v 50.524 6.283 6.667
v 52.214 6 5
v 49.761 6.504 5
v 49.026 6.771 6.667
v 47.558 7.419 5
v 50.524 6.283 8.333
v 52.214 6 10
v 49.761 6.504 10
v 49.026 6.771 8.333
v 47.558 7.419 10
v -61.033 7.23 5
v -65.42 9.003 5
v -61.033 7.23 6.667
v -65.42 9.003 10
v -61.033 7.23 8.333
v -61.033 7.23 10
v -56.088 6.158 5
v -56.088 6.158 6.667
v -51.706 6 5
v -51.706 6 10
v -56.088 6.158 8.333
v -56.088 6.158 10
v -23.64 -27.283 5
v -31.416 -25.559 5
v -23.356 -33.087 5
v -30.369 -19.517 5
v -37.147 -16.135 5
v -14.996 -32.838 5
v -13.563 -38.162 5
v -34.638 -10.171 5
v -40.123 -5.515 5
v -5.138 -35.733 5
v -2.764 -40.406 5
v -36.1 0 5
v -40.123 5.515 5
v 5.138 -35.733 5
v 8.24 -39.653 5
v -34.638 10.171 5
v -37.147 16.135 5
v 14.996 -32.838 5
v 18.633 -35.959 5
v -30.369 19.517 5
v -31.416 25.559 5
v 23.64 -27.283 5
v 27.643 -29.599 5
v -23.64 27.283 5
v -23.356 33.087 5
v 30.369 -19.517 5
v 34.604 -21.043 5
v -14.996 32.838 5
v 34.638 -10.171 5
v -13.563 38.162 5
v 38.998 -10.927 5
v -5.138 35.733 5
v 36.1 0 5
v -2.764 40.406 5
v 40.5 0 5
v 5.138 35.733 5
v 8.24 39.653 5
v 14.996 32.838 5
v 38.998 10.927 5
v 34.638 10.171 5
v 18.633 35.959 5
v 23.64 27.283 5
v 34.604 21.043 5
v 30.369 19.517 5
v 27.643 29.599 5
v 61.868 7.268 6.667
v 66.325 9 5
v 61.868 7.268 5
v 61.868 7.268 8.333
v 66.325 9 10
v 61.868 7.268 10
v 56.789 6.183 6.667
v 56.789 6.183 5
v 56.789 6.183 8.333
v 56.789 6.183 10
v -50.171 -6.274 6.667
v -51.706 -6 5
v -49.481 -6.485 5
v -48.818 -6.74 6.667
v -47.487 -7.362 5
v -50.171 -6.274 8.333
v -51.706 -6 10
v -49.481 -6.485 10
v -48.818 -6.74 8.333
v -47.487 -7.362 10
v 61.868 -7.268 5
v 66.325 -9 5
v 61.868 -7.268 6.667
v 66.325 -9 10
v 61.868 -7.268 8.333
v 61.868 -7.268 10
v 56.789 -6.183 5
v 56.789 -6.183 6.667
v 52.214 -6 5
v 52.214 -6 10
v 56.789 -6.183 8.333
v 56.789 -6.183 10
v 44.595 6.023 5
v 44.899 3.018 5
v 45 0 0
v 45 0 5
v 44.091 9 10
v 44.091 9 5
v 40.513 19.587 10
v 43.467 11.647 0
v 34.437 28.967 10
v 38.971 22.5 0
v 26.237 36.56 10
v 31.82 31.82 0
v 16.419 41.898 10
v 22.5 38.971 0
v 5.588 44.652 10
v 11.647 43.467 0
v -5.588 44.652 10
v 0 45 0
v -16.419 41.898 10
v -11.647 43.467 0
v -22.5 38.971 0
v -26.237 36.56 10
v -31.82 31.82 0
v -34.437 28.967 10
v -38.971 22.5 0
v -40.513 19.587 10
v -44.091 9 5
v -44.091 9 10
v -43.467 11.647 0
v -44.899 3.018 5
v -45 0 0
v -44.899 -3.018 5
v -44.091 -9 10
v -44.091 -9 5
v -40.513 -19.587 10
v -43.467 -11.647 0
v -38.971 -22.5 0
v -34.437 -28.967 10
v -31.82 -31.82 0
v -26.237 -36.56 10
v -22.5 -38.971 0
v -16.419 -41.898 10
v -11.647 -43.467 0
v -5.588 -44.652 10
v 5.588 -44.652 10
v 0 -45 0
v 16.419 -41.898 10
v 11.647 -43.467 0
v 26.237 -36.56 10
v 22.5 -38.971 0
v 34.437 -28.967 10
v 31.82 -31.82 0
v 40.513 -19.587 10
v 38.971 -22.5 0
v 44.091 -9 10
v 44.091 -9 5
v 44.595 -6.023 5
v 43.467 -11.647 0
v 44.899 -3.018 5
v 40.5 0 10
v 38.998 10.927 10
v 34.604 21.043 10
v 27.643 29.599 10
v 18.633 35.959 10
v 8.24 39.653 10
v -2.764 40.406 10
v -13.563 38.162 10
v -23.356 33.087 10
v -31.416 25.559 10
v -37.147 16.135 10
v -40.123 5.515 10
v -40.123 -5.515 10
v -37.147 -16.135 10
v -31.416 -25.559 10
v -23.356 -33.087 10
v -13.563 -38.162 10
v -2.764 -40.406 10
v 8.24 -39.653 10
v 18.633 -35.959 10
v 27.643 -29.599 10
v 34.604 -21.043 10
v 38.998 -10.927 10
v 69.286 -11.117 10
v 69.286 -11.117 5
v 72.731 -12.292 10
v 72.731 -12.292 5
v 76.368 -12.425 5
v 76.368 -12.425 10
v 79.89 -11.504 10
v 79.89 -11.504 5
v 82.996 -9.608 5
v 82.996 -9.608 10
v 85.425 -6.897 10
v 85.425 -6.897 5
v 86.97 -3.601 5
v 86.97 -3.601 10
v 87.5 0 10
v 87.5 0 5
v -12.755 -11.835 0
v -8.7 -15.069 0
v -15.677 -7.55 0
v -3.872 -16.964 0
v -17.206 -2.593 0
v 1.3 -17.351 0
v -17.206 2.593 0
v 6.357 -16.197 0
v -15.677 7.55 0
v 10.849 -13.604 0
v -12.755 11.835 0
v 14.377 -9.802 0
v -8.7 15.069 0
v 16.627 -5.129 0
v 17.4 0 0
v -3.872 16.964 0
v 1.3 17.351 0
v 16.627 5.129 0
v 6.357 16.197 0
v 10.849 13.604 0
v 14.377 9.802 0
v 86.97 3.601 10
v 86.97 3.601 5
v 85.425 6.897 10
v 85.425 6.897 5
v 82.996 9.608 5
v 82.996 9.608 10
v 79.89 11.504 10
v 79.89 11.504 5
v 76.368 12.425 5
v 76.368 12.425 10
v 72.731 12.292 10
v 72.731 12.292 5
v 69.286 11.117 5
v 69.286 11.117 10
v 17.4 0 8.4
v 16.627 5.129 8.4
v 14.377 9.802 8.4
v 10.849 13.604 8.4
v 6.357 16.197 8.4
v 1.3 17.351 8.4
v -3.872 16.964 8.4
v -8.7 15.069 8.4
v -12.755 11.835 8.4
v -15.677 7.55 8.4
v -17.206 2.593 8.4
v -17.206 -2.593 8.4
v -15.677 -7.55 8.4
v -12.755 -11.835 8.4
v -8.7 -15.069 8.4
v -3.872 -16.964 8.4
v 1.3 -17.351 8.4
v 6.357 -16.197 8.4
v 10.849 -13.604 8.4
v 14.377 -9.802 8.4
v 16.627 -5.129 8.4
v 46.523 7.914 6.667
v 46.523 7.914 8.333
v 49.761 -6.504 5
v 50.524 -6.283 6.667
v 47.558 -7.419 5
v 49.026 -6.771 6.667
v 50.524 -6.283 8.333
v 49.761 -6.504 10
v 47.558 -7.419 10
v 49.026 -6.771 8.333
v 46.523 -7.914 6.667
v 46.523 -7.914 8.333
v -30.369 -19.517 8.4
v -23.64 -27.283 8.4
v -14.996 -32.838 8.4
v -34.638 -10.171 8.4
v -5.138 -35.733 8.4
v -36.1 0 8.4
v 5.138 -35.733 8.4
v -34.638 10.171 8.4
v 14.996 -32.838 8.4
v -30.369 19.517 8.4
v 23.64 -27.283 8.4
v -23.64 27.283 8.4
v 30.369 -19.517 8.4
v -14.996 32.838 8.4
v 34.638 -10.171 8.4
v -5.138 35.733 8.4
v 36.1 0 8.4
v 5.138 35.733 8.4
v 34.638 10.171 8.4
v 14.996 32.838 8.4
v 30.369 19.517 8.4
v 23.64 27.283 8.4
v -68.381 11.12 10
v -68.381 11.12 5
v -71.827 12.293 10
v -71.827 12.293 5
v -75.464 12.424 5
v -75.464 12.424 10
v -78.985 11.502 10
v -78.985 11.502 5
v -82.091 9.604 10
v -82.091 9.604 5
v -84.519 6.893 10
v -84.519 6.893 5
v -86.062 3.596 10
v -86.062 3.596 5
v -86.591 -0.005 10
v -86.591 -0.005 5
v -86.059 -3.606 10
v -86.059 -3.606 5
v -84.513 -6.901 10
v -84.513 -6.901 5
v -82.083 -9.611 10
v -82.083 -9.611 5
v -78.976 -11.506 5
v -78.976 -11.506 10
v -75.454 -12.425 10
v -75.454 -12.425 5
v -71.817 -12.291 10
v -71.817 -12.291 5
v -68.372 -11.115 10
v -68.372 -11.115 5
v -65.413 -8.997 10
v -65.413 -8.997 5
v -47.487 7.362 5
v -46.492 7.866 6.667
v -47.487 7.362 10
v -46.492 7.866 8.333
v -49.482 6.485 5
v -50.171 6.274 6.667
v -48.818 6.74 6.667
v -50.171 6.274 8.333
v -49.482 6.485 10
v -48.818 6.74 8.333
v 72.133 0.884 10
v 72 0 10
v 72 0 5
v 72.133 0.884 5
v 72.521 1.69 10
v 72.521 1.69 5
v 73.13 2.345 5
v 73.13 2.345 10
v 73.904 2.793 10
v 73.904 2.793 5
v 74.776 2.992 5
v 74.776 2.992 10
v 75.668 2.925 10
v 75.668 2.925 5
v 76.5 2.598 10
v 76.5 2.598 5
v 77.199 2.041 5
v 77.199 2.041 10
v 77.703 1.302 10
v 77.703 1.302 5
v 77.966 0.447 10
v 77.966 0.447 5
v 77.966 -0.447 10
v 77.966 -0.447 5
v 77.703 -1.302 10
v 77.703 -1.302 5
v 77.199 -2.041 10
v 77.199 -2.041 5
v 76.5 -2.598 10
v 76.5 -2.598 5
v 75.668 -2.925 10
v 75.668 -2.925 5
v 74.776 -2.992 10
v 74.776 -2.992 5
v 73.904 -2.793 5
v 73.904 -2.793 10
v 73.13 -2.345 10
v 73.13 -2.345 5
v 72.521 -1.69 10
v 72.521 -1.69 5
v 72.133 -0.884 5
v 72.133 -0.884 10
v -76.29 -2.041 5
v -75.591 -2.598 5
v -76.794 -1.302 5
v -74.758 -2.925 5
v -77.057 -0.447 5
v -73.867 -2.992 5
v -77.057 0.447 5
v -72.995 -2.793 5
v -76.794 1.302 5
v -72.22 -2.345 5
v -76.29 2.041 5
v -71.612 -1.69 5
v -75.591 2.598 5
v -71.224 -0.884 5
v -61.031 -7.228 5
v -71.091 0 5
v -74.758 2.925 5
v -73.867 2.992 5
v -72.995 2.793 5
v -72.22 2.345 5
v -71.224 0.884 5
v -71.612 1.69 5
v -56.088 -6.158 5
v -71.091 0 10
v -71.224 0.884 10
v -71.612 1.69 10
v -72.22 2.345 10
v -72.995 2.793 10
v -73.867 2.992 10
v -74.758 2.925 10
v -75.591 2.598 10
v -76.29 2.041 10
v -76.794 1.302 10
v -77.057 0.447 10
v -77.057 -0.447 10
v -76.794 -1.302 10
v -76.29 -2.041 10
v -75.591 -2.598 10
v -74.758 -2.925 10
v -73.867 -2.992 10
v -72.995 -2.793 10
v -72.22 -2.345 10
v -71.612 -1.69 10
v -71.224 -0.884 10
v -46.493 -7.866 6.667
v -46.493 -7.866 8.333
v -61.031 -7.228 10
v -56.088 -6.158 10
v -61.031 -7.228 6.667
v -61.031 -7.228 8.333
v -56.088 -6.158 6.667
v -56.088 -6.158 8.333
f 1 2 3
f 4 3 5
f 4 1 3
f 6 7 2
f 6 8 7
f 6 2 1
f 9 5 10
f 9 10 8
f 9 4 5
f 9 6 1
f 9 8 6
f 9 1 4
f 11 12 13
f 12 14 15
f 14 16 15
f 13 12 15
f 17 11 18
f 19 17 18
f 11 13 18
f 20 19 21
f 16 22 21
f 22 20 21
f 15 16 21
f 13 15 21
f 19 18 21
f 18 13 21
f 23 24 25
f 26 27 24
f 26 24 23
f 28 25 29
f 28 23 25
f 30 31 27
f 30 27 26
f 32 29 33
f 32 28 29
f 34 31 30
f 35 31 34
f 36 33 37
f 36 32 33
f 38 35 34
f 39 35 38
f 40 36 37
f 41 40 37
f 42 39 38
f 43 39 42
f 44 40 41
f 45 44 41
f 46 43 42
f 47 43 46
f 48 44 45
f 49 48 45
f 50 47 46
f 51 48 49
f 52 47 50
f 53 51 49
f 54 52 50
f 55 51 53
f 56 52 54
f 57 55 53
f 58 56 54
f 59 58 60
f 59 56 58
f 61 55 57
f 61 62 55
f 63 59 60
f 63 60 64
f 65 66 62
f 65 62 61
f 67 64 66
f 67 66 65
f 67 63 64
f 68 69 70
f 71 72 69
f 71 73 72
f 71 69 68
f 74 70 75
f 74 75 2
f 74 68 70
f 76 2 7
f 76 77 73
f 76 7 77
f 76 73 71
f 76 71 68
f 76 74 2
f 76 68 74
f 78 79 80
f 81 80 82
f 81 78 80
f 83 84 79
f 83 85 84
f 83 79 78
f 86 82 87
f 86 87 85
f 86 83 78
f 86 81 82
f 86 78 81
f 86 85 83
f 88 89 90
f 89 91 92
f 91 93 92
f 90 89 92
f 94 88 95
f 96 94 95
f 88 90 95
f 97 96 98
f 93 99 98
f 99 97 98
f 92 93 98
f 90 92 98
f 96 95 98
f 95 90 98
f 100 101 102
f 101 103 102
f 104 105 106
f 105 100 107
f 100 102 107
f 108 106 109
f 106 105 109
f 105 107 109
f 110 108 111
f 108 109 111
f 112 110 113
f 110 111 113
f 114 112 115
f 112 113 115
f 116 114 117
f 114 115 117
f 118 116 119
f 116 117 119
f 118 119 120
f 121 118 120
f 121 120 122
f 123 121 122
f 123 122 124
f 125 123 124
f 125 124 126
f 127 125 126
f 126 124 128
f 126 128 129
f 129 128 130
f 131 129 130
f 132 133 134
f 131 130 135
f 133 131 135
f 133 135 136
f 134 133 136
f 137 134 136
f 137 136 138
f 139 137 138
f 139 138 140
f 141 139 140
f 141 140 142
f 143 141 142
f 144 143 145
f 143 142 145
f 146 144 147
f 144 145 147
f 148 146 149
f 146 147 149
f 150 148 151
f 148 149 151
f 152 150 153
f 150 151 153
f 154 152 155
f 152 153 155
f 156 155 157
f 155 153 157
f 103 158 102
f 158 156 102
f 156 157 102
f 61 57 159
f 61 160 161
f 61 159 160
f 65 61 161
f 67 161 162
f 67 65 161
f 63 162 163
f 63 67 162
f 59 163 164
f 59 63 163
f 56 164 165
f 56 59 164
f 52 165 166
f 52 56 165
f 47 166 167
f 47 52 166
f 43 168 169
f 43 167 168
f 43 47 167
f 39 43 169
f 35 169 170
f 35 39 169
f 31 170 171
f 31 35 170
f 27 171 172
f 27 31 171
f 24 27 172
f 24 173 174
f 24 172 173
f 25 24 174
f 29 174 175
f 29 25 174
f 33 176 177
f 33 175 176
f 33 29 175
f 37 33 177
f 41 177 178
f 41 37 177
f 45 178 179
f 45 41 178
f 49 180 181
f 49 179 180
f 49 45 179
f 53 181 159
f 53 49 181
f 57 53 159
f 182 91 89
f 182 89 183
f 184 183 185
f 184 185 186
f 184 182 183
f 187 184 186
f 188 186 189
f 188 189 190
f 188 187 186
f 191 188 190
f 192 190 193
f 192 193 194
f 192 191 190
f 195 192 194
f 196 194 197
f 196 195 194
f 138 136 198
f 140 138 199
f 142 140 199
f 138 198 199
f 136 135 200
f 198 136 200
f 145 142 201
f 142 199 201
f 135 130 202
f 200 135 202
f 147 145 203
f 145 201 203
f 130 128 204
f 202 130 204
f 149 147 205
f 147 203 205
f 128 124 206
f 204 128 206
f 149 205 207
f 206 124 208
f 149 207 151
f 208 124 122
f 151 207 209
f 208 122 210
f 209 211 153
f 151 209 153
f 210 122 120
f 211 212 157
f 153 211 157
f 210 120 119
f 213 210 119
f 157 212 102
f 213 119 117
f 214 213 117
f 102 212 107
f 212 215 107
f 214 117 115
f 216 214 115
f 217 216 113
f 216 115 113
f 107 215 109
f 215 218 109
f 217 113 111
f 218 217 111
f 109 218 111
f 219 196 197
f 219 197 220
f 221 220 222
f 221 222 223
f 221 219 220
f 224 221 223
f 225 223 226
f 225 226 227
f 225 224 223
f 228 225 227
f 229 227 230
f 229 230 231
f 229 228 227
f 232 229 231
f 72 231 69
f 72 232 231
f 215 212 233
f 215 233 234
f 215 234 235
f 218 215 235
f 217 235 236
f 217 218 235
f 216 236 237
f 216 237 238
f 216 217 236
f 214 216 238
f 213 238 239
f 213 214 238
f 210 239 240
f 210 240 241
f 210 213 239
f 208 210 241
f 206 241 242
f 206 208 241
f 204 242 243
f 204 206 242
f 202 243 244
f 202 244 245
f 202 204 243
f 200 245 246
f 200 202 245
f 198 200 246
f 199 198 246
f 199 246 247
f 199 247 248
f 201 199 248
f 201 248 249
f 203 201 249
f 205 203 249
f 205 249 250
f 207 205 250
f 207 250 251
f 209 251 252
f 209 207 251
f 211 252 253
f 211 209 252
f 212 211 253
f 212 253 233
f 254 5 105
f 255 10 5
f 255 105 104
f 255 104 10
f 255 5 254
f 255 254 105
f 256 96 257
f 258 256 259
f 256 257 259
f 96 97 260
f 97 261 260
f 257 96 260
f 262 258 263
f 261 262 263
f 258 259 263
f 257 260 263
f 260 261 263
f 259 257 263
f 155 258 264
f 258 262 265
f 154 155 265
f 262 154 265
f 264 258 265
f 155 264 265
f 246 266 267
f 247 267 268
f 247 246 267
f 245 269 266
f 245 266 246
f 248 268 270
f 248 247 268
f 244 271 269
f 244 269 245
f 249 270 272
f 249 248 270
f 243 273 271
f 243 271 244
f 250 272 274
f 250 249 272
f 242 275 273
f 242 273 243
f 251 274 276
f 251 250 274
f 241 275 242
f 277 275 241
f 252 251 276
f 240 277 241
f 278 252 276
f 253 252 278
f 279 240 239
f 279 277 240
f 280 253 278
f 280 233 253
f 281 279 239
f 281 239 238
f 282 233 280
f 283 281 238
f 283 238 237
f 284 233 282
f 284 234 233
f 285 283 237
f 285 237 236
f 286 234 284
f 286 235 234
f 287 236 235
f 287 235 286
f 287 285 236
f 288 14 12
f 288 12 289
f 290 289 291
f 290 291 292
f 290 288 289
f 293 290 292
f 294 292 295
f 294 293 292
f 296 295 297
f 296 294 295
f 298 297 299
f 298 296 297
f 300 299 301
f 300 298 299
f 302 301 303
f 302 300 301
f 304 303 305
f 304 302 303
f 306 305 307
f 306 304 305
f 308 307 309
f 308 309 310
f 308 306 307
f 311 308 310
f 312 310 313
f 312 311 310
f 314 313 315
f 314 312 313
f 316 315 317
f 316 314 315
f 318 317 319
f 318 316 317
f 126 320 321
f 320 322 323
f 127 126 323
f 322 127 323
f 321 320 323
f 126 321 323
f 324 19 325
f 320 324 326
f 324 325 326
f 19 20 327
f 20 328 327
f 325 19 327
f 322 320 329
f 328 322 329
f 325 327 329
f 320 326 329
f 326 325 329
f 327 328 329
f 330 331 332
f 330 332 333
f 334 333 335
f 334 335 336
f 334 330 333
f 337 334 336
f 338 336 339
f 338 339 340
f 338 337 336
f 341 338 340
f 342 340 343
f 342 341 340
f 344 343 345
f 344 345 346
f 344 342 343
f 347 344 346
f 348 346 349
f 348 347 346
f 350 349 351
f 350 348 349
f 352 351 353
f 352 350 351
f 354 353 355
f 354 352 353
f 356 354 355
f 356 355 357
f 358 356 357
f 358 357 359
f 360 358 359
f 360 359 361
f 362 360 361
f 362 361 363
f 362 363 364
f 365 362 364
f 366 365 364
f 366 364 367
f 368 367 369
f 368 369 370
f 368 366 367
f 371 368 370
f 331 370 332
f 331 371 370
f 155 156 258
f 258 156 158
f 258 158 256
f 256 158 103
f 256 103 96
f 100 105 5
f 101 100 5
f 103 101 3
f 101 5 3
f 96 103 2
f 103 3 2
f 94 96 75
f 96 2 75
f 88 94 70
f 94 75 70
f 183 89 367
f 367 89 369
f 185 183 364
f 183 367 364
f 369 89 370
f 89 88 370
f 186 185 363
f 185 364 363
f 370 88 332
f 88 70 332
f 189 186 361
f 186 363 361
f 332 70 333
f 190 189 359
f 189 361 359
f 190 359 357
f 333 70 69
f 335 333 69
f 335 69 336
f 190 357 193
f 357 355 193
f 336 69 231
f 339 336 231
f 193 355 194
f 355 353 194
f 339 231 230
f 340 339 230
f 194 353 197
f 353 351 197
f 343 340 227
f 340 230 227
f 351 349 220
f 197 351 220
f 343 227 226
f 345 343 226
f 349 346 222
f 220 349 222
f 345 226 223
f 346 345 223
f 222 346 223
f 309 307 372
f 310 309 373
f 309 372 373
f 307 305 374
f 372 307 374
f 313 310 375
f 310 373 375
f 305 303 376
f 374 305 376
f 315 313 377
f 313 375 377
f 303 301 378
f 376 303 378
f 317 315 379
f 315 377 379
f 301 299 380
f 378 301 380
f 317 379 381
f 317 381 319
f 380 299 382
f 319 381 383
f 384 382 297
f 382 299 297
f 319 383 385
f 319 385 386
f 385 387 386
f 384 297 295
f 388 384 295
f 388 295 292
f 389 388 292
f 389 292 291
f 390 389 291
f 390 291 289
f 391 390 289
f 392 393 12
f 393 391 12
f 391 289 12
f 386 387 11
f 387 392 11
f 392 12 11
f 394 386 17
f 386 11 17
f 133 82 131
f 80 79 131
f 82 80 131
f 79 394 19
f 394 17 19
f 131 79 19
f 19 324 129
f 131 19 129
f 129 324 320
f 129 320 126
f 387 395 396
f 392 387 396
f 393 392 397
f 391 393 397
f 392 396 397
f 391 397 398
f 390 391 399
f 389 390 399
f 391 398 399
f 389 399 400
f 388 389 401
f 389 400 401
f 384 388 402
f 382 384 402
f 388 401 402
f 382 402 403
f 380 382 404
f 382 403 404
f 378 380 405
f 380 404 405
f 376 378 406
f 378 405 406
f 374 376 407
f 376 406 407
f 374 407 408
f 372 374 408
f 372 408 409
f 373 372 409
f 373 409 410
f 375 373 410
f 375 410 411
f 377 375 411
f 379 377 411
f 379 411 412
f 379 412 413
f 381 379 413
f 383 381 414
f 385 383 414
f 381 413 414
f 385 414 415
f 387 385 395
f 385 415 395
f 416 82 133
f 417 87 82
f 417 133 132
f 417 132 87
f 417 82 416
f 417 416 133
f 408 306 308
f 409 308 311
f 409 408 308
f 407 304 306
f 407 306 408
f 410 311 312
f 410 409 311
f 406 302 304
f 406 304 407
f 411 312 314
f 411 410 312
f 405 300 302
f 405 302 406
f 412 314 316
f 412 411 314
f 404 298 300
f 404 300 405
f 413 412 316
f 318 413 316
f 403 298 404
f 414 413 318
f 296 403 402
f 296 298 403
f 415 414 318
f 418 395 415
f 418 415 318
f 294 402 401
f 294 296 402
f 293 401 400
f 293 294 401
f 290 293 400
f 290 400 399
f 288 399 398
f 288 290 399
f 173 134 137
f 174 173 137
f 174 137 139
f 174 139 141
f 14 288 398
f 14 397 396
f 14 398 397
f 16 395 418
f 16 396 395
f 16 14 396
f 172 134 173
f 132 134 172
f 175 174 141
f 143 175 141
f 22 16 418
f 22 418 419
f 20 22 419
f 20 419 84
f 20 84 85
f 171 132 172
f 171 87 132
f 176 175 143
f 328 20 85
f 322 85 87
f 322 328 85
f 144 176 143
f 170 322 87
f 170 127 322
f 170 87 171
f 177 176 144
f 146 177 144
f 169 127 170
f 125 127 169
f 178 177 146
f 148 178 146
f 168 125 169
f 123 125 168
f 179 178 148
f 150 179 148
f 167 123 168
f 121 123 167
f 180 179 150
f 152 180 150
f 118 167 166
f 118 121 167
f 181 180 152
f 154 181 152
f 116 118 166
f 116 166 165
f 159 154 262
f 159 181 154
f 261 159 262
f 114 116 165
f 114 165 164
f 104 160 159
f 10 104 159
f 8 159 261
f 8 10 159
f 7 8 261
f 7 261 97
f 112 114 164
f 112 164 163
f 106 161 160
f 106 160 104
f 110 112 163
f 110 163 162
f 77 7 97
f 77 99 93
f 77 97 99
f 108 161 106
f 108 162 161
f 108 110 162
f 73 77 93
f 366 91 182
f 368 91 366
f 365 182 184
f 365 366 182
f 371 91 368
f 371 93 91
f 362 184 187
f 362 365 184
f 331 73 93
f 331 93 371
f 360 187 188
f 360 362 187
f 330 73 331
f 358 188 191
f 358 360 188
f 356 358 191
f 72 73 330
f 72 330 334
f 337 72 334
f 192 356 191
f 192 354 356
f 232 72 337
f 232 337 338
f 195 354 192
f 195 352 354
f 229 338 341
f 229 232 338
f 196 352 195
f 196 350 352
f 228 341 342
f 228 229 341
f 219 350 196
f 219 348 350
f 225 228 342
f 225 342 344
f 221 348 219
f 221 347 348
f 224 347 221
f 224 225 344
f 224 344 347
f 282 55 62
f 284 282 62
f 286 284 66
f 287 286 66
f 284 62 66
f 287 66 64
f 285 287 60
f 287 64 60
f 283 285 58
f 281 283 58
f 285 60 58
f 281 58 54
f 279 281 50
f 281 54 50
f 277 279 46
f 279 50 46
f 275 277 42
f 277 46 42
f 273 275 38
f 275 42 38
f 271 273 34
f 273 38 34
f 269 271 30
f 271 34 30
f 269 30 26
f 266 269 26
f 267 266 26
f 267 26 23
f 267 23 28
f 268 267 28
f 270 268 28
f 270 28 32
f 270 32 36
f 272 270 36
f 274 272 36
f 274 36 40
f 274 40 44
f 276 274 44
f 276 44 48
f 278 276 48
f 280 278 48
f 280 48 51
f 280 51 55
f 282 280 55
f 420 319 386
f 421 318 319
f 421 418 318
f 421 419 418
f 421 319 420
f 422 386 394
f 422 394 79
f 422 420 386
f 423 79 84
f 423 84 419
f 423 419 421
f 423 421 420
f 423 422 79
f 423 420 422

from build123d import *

# Parameters (mm, degrees)
F0_R        = 45
F0_R_2      = 40.5
F1_DEPTH    = 10
F0_R_3      = 36.1
F2_DEPTH    = 5
F0_R_4      = 31
F3_DEPTH    = 8.4
F0_R_5      = 17.4
F4_DEPTH    = 8.4
F5_R        = 3
F1_FACE_R   = 45
F1_FACE_R_2 = 40.5
F6_DEPTH    = 5


with BuildPart() as f1:
    # F0 (on Top) → F1 (new body)
    with BuildSketch(Plane.XY):
        Circle(F0_R)
        Circle(F0_R_2, mode=Mode.SUBTRACT)
    extrude(amount=F1_DEPTH)

    # F0 (on Top) → F2 (join)
    with BuildSketch(Plane.XY):
        Circle(F0_R_2)
        Circle(F0_R_3, mode=Mode.SUBTRACT)
    extrude(amount=F2_DEPTH)

    # F0 (on Top) → F3 (join)
    with BuildSketch(Plane.XY):
        Circle(F0_R_3)
        Circle(F0_R_4, mode=Mode.SUBTRACT)
    extrude(amount=F3_DEPTH)

    # F0 (on Top) → F4 (join)
    with BuildSketch(Plane.XY):
        Circle(F0_R_4)
        Circle(F0_R_5, mode=Mode.SUBTRACT)
    extrude(amount=F4_DEPTH)

    # F5 (on face) + F1_face (on face) → F6 (join)
    with BuildSketch(Plane.XY.offset(10)):
        with BuildLine():
            ThreePointArc((66.3253242136, -9), (79.8896090165, -11.5039872942), (87.5, 0))
            ThreePointArc((87.5, 0), (79.8896090165, 11.5039872942), (66.3253242136, 9))
            Line((66.3253242136, 9), (66.3253242136, 0))
            Line((66.3253242136, 0), (66.3253242136, -9))
        make_face()
        with BuildLine():
            ThreePointArc((78, 0), (75, -3), (72, 0))
            ThreePointArc((72, 0), (75, 3), (78, 0))
        make_face(mode=Mode.SUBTRACT)
        with BuildLine():
            ThreePointArc((62.5527321378, -1.1469624085), (63.7327165773, -5.4127926501), (66.3253242136, -9))
            Line((66.3253242136, -9), (66.3253242136, 0))
            Line((66.3253242136, 0), (62.5527321378, 0))
            Line((62.5527321378, 0), (62.5527321378, -1.1469624085))
        make_face()
        with BuildLine():
            Line((66.3253242136, 0), (66.3253242136, 9))
            ThreePointArc((66.3253242136, 9), (63.7327165773, 5.4127926501), (62.5527321378, 1.1469624085))
            Line((62.5527321378, 1.1469624085), (62.5527321378, 0))
            Line((62.5527321378, 0), (66.3253242136, 0))
        make_face()
        with BuildLine():
            ThreePointArc((62.5527321378, 1.1469624085), (63.7327165773, 5.4127926501), (66.3253242136, 9))
            add(Edge.make_bspline(
                [(66.3253242136, 9), (62.5527321378, 7.0294414229), (56.1633100825, 5.6459116487), (52.2136635361, 6)],
                knots=[0, 0, 0, 0, 0.5634667873, 0.5634667873, 0.5634667873, 0.5634667873], degree=3))
            Line((52.2136635361, 6), (52.2136635361, 0))
            Line((52.2136635361, 0), (62.5, 0))
            ThreePointArc((62.5, 0), (62.5131899935, 0.5740869806), (62.5527321378, 1.1469624085))
        make_face()
        with BuildLine():
            add(Edge.make_bspline(
                [(52.2136635361, -6), (50.3742603721, -6.1649036758), (49.0640175166, -6.7066774941), (47.5582238129, -7.4185810788)],
                knots=[0.5634667873, 0.5634667873, 0.5634667873, 0.5634667873, 0.8258807981, 0.8258807981, 0.8258807981, 0.8258807981], degree=3))
            Line((52.2136635361, -6), (52.2136635361, 0))
            Line((52.2136635361, 0), (47.5582238129, 0))
            Line((47.5582238129, 0), (47.5582238129, -7.4185810788))
        make_face()
        with BuildLine():
            Line((62.5527321378, 0), (62.5527321378, 1.1469624085))
            ThreePointArc((62.5527321378, 1.1469624085), (62.5131899935, 0.5740869806), (62.5, 0))
            Line((62.5, 0), (62.5527321378, 0))
        make_face()
        with BuildLine():
            ThreePointArc((62.5, 0), (62.5131899935, -0.5740869806), (62.5527321378, -1.1469624085))
            Line((62.5527321378, -1.1469624085), (62.5527321378, 0))
            Line((62.5527321378, 0), (62.5, 0))
        make_face()
        with BuildLine():
            add(Edge.make_bspline(
                [(66.3253242136, -9), (62.5527321378, -7.0294414229), (56.1633100825, -5.6459116487), (52.2136635361, -6)],
                knots=[0, 0, 0, 0, 0.5634667873, 0.5634667873, 0.5634667873, 0.5634667873], degree=3))
            ThreePointArc((66.3253242136, -9), (63.7327165773, -5.4127926501), (62.5527321378, -1.1469624085))
            ThreePointArc((62.5527321378, -1.1469624085), (62.5131899935, -0.5740869806), (62.5, 0))
            Line((62.5, 0), (52.2136635361, 0))
            Line((52.2136635361, 0), (52.2136635361, -6))
        make_face()
        with BuildLine():
            Line((52.2136635361, 0), (52.2136635361, 6))
            add(Edge.make_bspline(
                [(52.2136635361, 6), (50.3742603721, 6.1649036758), (49.0640175166, 6.7066774941), (47.5582238129, 7.4185810788)],
                knots=[0.5634667873, 0.5634667873, 0.5634667873, 0.5634667873, 0.8258807981, 0.8258807981, 0.8258807981, 0.8258807981], degree=3))
            Line((47.5582238129, 7.4185810788), (47.5582238129, 0))
            Line((47.5582238129, 0), (52.2136635361, 0))
        make_face()
        with BuildLine():
            add(Edge.make_bspline(
                [(47.5582238129, -7.4185810788), (46.5590866207, -7.8909494696), (45.4738542162, -8.4382209279), (44.0908153701, -9)],
                knots=[0.8258807981, 0.8258807981, 0.8258807981, 0.8258807981, 1, 1, 1, 1], degree=3))
            Line((47.5582238129, -7.4185810788), (47.5582238129, 0))
            Line((47.5582238129, 0), (45, 0))
            ThreePointArc((45, 0), (44.7721268852, -4.5229032902), (44.0908153701, -9))
        make_face()
        with BuildLine():
            Line((47.5582238129, 0), (47.5582238129, 7.4185810788))
            add(Edge.make_bspline(
                [(47.5582238129, 7.4185810788), (46.5590866207, 7.8909494696), (45.4738542162, 8.4382209279), (44.0908153701, 9)],
                knots=[0.8258807981, 0.8258807981, 0.8258807981, 0.8258807981, 1, 1, 1, 1], degree=3))
            ThreePointArc((44.0908153701, 9), (44.7721268852, 4.5229032902), (45, 0))
            Line((45, 0), (47.5582238129, 0))
        make_face()
        with BuildLine():
            ThreePointArc((-44.0908153701, -9), (0, -45), (44.0908153701, -9))
            Line((44.0908153701, -9), (44.0908153701, 0))
            Line((44.0908153701, 0), (40.5, 0))
            ThreePointArc((40.5, 0), (0, -40.5), (-40.5, 0))
            Line((-40.5, 0), (-44.0908153701, 0))
            Line((-44.0908153701, 0), (-44.0908153701, -9))
        make_face()
        with BuildLine():
            Line((-51.7064335188, 0), (-51.7064335188, 6))
            add(Edge.make_bspline(
                [(-65.4197458811, 9.0034745469), (-61.6860010238, 6.9482695309), (-55.4334302889, 5.6320399313), (-51.7064335188, 6)],
                knots=[0, 0, 0, 0, 0.567027295, 0.567027295, 0.567027295, 0.567027295], degree=3))
            ThreePointArc((-65.4197458811, 9.0034745469), (-62.911579364, 5.5923771619), (-61.6860010238, 1.5396691315))
            ThreePointArc((-61.6860010238, 1.5396691315), (-61.6146344775, 0.7713043082), (-61.5908153701, 0))
            Line((-61.5908153701, 0), (-51.7064335188, 0))
        make_face()
        with BuildLine():
            ThreePointArc((-45, 0), (-44.7721268852, -4.5229032902), (-44.0908153701, -9))
            Line((-44.0908153701, -9), (-44.0908153701, 0))
            Line((-44.0908153701, 0), (-45, 0))
        make_face()
        with BuildLine():
            add(Edge.make_bspline(
                [(-65.4125331798, -8.996522563), (-61.6860010238, -6.9482695309), (-55.4331204309, -5.6323249689), (-51.7064335188, -6)],
                knots=[0, 0, 0, 0, 0.566952665, 0.566952665, 0.566952665, 0.566952665], degree=3))
            Line((-51.7064335188, -6), (-51.7064335188, 0))
            Line((-51.7064335188, 0), (-61.5908153701, 0))
            ThreePointArc((-61.5908153701, 0), (-61.6146344775, -0.7713043082), (-61.6860010238, -1.5396691315))
            ThreePointArc((-61.6860010238, -1.5396691315), (-62.9093393644, -5.5878971298), (-65.4125331798, -8.996522563))
        make_face()
        with BuildLine():
            add(Edge.make_bspline(
                [(-51.7064335188, -6), (-50.0263203675, -6.1657600088), (-48.8596569, -6.6737162451), (-47.4872474781, -7.3615768954)],
                knots=[0.566952665, 0.566952665, 0.566952665, 0.566952665, 0.8225535918, 0.8225535918, 0.8225535918, 0.8225535918], degree=3))
            Line((-47.4872474781, -7.3615768954), (-47.4872474781, 0))
            Line((-47.4872474781, 0), (-51.7064335188, 0))
            Line((-51.7064335188, 0), (-51.7064335188, -6))
        make_face()
        with BuildLine():
            ThreePointArc((-61.6860010238, 1.5396691315), (-62.911579364, 5.5923771619), (-65.4197458811, 9.0034745469))
            Line((-65.4197458811, 9.0034745469), (-65.4197458811, 0.0034745469))
            Line((-65.4197458811, 0.0034745469), (-65.4197430965, 0))
            Line((-65.4197430965, 0), (-61.6860010238, 0))
            Line((-61.6860010238, 0), (-61.6860010238, 1.5396691315))
        make_face()
        with BuildLine():
            Line((-65.4197430965, 0), (-65.4125331798, -8.996522563))
            ThreePointArc((-65.4125331798, -8.996522563), (-62.9093393644, -5.5878971298), (-61.6860010238, -1.5396691315))
            Line((-61.6860010238, -1.5396691315), (-61.6860010238, 0))
            Line((-61.6860010238, 0), (-65.4197430965, 0))
        make_face()
        with BuildLine():
            add(Edge.make_bspline(
                [(-47.4872474781, -7.3615768954), (-46.5344765882, -7.8391119468), (-45.482544702, -8.4033534464), (-44.0908153701, -9)],
                knots=[0.8225535918, 0.8225535918, 0.8225535918, 0.8225535918, 1, 1, 1, 1], degree=3))
            ThreePointArc((-44.0908153701, -9), (-44.7721268852, -4.5229032902), (-45, 0))
            Line((-45, 0), (-47.4872474781, 0))
            Line((-47.4872474781, 0), (-47.4872474781, -7.3615768954))
        make_face()
        with BuildLine():
            ThreePointArc((-45, 0), (-44.7721268852, 4.5229032902), (-44.0908153701, 9))
            add(Edge.make_bspline(
                [(-47.4872474781, 7.3617098784), (-46.5344445734, 7.8392079283), (-45.4824537219, 8.4033924504), (-44.0908153701, 9)],
                knots=[0.8225957704, 0.8225957704, 0.8225957704, 0.8225957704, 1, 1, 1, 1], degree=3))
            Line((-47.4872474781, 7.3617098784), (-47.4872474781, 0))
            Line((-47.4872474781, 0), (-45, 0))
        make_face()
        with BuildLine():
            Line((-44.0908153701, 0), (-44.0908153701, 9))
            ThreePointArc((-44.0908153701, 9), (-44.7721268852, 4.5229032902), (-45, 0))
            Line((-45, 0), (-44.0908153701, 0))
        make_face()
        with BuildLine():
            ThreePointArc((-61.6860010238, -1.5396691315), (-61.6146344775, -0.7713043082), (-61.5908153701, 0))
            Line((-61.5908153701, 0), (-61.6860010238, 0))
            Line((-61.6860010238, 0), (-61.6860010238, -1.5396691315))
        make_face()
        with BuildLine():
            ThreePointArc((-61.5908153701, 0), (-61.6146344775, 0.7713043082), (-61.6860010238, 1.5396691315))
            Line((-61.6860010238, 1.5396691315), (-61.6860010238, 0))
            Line((-61.6860010238, 0), (-61.5908153701, 0))
        make_face()
        with BuildLine():
            Line((-47.4872474781, 0), (-47.4872474781, 7.3617098784))
            add(Edge.make_bspline(
                [(-51.7064335188, 6), (-50.0266151205, 6.1658456208), (-48.8598550323, 6.6738263432), (-47.4872474781, 7.3617098784)],
                knots=[0.567027295, 0.567027295, 0.567027295, 0.567027295, 0.8225957704, 0.8225957704, 0.8225957704, 0.8225957704], degree=3))
            Line((-51.7064335188, 6), (-51.7064335188, 0))
            Line((-51.7064335188, 0), (-47.4872474781, 0))
        make_face()
        with BuildLine():
            Line((-65.4197458811, 0.0034745469), (-65.4197458811, 9.0034745469))
            ThreePointArc((-65.4197458811, 9.0034745469), (-86.5908143666, -0.0050088207), (-65.4125331798, -8.996522563))
            Line((-65.4125331798, -8.996522563), (-65.4197430965, 0))
            Line((-65.4197430965, 0), (-65.4197458811, 0.0034745469))
        make_face()
        with Locations((-74.0908153701, 0)):
            Circle(F5_R, mode=Mode.SUBTRACT)
    with BuildSketch(Plane.XY.offset(10)):
        Circle(F1_FACE_R)
        Circle(F1_FACE_R_2, mode=Mode.SUBTRACT)
    extrude(amount=-F6_DEPTH)


solid = f1.part
